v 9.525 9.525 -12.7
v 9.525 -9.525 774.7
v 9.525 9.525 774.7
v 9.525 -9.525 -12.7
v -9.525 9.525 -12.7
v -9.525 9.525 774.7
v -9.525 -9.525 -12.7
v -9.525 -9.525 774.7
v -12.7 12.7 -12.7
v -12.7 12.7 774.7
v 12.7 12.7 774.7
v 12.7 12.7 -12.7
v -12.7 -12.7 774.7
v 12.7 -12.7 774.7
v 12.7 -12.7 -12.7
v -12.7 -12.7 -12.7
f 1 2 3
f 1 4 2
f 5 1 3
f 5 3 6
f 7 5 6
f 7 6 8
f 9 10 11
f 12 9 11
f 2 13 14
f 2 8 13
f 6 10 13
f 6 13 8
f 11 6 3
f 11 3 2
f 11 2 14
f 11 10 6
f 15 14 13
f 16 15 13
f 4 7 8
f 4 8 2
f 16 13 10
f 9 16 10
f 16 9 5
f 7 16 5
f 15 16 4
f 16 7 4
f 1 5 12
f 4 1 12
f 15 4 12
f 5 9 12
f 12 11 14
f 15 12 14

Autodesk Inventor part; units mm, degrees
ref_plane "Start Plane" through (0, 0, -12.7) normal (0, 0, 1) x (1, 0, 0)
ref_plane "End Plane" through (0, 0, 774.7) normal (0, 0, 1) x (1, 0, 0)
sketch "Sketch" plane through (0, 0, 0) normal (0, 0, 1) x (1, 0, 0)
  line L0 (-12.7, 12.7) -> (12.7, 12.7)
  line L1 (12.7, 12.7) -> (12.7, -12.7)
  line L2 (12.7, -12.7) -> (-12.7, -12.7)
  line L3 (-12.7, -12.7) -> (-12.7, 12.7)
  line L4 (9.525, 9.525) -> (-9.525, 9.525)
  line L5 (-9.525, 9.525) -> (-9.525, -9.525)
  line L6 (-9.525, -9.525) -> (9.525, -9.525)
  line L7 (9.525, -9.525) -> (9.525, 9.525)
  point P0 (0, 0)
  point P1 (0, 12.7)
  point P2 (-12.7, 0)
  dimension "width" = 25.4
  dimension "d1" = 3.175
extrude "Body" add sketch "Sketch" along normal up to surface (787.4 mm away) from surface at -12.7
sketch "Sketch4" plane through (0, 0, 0) normal (0, 0, 1) x (1, 0, 0)
  line L0 (0, 0) -> (10, 0)
ref_plane "Work Plane4" through (0, 0, 0) normal (0, -1, 0) x (1, 0, 0)
sketch "Sketch5" plane through (0, 0, 0) normal (0, -1, 0) x (1, 0, 0)
  line L0 (-2, -12.7) -> (12, -12.7)
  line L1 (-2, 774.7) -> (12, 774.7)
  dimension "d9" = 787.4
ref_plane "Work Plane5" through (0, 12.7, -12.7) normal (0, 0, -1) x (-1, 0, 0)
split "Split1" plane through (0, 12.7, -12.7) removes the side toward (0, 0, -1)
ref_plane "Work Plane6" through (254, 12.7, 774.7) normal (0, 0, 1) x (1, 0, 0)
split "Split2" plane through (254, 12.7, 774.7) removes the side toward (0, 0, 1)
equation "\"G_OFFSET_START\" = 12.7"
equation "\"G_OFFSET_END\" = 12.7"
equation "\"d4\" = -G_OFFSET_START"
equation "\"d5\" = length + G_OFFSET_END"
equation "\"G_L\" = 762"
equation "\"length\" = 762"
properties part number "Square Tube Profile" material "Aluminum-6061"
